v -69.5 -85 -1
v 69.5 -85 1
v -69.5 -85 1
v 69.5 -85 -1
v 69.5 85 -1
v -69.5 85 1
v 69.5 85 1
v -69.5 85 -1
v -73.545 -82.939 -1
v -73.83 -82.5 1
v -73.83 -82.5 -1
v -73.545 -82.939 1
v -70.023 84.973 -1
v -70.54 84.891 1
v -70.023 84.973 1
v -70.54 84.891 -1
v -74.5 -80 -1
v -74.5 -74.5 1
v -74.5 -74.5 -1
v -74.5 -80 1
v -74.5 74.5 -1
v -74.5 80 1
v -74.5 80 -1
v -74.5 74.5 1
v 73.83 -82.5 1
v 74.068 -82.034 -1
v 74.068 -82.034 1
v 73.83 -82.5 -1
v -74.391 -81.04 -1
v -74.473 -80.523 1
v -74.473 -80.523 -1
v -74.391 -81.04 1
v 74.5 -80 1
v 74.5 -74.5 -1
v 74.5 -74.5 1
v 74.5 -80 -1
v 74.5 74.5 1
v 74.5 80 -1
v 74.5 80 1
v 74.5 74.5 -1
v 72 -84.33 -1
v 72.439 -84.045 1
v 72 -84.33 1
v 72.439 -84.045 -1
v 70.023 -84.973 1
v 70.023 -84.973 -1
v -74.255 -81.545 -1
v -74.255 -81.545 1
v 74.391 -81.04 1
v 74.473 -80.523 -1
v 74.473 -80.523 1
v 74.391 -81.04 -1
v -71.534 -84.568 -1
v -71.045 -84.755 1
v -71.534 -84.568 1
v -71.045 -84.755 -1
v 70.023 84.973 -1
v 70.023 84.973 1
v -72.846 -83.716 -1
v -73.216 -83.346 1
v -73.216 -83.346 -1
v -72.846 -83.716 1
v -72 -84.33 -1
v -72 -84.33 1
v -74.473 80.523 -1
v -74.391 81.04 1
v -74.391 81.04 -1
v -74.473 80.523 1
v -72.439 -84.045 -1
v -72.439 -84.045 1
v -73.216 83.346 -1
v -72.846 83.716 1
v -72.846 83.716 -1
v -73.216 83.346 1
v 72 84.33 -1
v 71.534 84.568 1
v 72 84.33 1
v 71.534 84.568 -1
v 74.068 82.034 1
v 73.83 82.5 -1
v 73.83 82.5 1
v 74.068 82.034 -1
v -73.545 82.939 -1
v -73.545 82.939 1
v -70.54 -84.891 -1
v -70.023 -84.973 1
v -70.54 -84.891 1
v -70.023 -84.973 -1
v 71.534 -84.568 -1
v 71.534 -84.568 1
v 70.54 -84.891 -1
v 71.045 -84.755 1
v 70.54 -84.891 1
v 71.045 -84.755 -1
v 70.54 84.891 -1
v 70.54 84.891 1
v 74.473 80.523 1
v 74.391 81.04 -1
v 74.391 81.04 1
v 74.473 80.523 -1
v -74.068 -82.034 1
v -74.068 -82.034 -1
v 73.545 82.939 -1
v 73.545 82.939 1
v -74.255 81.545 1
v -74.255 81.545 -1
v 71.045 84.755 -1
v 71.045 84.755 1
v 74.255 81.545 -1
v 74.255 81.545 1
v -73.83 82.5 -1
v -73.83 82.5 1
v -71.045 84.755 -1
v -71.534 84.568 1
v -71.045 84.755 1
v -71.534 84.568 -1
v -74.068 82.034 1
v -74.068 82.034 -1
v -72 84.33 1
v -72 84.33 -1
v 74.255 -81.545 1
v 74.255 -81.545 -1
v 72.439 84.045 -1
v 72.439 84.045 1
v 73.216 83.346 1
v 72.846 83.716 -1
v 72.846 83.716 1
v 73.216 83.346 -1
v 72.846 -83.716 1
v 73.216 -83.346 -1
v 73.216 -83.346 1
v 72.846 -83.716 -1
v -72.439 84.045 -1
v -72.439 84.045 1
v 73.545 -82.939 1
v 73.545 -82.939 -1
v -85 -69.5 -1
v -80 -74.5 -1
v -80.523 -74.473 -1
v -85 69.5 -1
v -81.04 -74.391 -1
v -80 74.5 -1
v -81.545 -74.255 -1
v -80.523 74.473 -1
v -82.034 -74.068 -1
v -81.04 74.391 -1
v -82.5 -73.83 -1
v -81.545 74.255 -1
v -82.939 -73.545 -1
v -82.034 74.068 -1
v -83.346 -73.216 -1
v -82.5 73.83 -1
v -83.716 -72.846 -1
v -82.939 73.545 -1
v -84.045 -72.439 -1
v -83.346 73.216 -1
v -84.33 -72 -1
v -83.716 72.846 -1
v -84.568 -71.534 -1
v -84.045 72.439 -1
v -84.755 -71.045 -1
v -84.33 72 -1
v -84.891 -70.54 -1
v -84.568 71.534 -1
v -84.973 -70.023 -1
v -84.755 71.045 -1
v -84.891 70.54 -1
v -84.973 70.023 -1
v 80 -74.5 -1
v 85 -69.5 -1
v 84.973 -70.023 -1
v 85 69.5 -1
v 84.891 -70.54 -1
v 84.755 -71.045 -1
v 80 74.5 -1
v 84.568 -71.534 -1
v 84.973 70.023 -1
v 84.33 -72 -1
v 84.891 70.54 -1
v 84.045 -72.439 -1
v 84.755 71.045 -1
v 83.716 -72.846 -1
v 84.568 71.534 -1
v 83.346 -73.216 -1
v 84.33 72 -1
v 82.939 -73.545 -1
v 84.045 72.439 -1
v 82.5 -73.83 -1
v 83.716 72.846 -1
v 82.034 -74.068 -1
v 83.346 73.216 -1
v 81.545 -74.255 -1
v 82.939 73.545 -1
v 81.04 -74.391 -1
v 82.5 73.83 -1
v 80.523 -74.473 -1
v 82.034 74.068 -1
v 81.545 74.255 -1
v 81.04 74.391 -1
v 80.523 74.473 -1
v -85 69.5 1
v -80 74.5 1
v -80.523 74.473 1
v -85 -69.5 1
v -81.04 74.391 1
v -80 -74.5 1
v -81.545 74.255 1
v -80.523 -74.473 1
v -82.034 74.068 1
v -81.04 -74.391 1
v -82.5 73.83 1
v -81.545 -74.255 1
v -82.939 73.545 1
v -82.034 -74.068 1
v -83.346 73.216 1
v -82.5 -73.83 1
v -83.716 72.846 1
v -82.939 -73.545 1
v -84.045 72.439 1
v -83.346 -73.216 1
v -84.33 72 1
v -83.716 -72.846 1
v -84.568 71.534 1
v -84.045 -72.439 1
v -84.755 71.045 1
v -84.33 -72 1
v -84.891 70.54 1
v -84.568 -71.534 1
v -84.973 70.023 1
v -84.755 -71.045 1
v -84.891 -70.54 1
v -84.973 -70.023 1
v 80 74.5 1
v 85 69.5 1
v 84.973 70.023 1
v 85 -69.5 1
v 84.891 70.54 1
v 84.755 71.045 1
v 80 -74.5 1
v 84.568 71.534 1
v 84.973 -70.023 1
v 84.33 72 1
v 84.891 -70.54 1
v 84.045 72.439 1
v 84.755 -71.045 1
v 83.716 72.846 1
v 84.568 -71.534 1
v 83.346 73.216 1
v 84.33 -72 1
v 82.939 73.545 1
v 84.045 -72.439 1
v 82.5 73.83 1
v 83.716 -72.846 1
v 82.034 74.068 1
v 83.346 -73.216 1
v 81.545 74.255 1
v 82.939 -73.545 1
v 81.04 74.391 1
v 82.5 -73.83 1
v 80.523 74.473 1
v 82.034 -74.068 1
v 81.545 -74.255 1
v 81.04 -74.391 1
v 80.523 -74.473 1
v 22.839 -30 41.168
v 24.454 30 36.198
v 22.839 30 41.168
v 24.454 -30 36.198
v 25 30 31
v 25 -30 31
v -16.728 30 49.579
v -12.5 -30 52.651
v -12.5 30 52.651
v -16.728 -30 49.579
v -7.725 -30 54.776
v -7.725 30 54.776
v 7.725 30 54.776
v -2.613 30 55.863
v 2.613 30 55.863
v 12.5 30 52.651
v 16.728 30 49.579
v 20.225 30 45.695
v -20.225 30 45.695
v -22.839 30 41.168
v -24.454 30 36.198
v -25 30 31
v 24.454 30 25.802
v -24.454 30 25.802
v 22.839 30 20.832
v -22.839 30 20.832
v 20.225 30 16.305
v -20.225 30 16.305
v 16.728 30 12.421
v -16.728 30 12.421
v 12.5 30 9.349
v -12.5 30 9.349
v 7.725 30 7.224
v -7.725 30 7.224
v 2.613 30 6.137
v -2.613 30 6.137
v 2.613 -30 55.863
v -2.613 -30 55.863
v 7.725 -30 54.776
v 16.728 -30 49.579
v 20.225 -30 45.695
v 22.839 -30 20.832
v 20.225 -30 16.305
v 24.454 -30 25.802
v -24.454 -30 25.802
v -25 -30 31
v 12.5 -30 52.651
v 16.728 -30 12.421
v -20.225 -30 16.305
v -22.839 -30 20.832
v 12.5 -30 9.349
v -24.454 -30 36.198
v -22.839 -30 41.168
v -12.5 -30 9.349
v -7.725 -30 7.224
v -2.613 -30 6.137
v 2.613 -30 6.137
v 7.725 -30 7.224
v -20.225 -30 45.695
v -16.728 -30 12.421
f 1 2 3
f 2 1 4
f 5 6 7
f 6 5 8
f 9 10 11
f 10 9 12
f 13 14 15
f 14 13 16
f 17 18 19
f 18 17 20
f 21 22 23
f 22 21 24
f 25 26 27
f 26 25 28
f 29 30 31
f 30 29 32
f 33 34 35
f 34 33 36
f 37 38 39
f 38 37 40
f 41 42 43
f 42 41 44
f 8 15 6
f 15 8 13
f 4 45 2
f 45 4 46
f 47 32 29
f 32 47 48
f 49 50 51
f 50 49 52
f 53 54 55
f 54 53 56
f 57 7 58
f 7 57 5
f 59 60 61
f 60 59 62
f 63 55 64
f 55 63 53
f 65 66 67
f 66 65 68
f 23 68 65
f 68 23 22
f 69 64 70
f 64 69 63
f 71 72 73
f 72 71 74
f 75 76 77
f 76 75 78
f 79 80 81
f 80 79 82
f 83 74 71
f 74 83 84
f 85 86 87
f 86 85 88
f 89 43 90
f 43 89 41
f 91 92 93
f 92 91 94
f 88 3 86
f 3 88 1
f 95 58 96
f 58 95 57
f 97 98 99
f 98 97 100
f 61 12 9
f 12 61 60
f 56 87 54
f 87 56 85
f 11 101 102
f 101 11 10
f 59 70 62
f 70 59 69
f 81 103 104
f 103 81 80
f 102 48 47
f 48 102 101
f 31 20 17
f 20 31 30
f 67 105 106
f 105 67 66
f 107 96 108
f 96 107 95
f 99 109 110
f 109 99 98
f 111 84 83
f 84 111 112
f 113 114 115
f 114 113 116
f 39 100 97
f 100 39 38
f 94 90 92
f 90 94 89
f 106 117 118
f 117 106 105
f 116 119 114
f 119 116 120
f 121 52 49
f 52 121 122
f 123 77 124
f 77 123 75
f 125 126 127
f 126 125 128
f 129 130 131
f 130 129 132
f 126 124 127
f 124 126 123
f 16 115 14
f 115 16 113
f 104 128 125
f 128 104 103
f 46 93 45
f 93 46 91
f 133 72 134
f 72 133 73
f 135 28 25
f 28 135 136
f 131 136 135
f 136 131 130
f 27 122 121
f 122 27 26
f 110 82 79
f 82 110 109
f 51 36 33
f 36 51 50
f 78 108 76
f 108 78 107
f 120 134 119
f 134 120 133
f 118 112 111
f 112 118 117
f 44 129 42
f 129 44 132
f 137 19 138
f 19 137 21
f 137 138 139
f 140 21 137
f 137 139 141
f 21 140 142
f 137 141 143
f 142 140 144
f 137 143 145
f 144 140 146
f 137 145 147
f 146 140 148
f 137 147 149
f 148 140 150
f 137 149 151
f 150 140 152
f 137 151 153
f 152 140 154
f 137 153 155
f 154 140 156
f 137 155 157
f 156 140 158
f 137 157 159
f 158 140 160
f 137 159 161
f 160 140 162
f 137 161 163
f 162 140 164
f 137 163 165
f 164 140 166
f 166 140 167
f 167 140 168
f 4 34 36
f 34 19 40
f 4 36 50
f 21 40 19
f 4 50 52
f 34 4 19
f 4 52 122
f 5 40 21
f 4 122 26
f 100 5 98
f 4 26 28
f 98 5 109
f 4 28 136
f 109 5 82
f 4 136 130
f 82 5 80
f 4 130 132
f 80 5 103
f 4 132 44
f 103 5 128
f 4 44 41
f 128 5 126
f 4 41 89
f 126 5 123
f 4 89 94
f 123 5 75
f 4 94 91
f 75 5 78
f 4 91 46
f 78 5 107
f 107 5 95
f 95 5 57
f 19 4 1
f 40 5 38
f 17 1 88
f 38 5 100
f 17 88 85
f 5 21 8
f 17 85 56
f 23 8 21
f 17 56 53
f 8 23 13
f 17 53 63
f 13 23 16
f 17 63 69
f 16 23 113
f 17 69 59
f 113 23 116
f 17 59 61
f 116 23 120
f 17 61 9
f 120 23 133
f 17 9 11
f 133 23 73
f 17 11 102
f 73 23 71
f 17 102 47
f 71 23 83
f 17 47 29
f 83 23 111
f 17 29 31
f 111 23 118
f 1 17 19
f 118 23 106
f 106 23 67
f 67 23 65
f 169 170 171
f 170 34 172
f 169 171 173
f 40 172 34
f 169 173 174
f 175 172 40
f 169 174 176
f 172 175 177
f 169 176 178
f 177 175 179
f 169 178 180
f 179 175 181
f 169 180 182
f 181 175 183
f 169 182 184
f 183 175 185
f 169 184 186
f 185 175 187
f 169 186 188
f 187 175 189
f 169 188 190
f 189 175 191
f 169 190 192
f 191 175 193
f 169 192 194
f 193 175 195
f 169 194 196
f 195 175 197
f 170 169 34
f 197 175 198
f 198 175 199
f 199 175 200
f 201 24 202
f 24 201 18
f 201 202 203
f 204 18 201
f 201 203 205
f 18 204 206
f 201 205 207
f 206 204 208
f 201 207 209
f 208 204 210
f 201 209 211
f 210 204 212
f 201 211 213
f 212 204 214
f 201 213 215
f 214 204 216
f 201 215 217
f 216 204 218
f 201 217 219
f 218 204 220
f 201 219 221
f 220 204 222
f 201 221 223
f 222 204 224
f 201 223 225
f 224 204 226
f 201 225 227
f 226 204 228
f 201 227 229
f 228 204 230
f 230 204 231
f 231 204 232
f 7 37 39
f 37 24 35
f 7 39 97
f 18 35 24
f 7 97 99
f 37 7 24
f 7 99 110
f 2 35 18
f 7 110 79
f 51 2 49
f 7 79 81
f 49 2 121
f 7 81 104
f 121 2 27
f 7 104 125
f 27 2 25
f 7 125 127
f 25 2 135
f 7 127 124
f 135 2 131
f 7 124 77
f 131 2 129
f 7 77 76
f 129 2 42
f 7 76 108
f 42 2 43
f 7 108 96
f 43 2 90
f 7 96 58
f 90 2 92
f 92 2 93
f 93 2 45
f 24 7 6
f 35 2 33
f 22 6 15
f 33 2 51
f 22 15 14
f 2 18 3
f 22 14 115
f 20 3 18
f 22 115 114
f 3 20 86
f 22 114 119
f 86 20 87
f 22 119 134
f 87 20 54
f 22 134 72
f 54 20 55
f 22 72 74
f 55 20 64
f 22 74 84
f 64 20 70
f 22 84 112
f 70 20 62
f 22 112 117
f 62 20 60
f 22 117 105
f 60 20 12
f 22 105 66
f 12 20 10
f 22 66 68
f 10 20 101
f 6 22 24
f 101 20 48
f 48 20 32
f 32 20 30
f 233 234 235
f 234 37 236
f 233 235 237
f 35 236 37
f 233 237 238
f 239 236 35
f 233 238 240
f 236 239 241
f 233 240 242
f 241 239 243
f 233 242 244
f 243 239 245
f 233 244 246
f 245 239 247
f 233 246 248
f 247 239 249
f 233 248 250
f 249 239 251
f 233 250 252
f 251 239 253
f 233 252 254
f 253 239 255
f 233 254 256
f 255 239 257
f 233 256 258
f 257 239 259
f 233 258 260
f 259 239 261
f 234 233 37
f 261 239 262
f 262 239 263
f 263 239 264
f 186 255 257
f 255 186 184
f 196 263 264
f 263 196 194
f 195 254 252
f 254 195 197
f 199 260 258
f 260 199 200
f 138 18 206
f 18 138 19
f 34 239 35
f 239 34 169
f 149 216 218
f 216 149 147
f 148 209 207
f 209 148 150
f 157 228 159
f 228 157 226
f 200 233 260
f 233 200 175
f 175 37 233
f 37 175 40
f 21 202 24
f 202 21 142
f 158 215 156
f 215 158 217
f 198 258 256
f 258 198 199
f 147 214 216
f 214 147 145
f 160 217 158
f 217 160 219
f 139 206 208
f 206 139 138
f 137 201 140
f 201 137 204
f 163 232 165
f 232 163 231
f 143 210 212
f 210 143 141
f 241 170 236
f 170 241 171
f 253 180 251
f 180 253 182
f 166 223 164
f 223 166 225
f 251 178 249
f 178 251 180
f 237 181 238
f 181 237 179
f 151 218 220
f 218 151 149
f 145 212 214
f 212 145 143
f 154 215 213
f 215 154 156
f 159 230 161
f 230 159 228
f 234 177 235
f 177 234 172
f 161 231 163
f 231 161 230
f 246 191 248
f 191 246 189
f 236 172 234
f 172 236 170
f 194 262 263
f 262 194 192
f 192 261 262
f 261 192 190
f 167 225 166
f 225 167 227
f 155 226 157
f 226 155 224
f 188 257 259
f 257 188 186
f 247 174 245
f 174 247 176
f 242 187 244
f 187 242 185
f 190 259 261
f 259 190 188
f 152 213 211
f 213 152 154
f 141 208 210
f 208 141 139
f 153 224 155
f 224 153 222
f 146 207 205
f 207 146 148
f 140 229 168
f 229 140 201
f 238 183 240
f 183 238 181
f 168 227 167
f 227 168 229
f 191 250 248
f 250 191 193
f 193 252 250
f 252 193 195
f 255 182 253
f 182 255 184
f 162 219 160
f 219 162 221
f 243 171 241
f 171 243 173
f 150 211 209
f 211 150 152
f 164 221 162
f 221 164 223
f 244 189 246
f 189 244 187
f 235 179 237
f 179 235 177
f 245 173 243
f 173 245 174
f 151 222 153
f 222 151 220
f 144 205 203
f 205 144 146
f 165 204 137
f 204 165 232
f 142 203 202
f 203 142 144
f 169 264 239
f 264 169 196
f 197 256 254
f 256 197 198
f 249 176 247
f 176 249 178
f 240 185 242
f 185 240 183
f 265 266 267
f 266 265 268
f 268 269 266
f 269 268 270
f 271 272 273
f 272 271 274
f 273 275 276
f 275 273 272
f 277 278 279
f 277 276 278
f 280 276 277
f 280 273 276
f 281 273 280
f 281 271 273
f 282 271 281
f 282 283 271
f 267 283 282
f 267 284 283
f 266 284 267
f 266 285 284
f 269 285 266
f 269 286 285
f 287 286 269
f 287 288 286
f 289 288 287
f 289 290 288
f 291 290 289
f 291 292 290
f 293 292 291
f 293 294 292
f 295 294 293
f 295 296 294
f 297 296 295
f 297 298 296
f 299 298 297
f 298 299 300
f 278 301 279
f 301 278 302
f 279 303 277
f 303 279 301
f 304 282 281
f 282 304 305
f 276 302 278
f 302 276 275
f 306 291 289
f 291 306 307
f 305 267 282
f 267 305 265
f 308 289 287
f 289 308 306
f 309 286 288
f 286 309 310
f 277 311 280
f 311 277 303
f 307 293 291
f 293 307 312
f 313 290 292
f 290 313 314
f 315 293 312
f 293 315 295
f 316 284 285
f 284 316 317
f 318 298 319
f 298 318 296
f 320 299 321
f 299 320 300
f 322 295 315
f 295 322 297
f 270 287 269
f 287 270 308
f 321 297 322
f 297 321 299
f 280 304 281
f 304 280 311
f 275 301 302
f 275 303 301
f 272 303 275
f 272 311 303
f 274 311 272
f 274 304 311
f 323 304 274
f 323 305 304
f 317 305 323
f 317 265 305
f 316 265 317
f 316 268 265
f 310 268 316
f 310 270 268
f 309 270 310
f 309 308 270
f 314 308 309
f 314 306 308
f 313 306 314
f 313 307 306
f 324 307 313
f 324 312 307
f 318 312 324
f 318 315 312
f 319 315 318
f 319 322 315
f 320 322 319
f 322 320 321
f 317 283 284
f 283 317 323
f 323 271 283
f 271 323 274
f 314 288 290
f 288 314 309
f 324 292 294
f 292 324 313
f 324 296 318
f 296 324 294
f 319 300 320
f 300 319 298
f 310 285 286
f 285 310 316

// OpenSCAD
// file: ../core/standoffs.scad
// ============== ETHOSCOPE CHILD MODULES ============= //



// module standoff_single(bolt_diam, standoff_height, wall_thick){
//     bolt_diam = bolt_diam + 0.15; // Here's changing the camera bolt size
//     $fn=30;
//     difference(){
//         hull(){
//             translate([0,0,standoff_height-0.2]) cylinder(d=bolt_diam+wall_thick, h=0.1);
//             cylinder(d=(bolt_diam+wall_thick)*standoff_height/4, h=0.1);
//         }
//         cylinder(d=bolt_diam, h=standoff_height); 
//     }
// }


// module standoff_quad(standoff_dims, bolt_diam, wall_thick){
//     for (i=[-1,1]){
//         translate([standoff_dims[0]/2,i*standoff_dims[1]/2,0])
//         standoff_single(bolt_diam, standoff_dims[2], wall_thick);
//     }
//     mirror([1,0,0])
//     for (i=[-1,1]){
//         translate([standoff_dims[0]/2,i*standoff_dims[1]/2,0])
//         standoff_single(bolt_diam, standoff_dims[2], wall_thick);
//     }
// }
// file: ../core/rounded_cube.scad
module rounded_cube(
    dims, 
    radius=1, 
    outside=false, 
    $fn=60
) {

    new_dims = dims / 2;
    if (outside==true){
        new_dims = [new_dims[0] - radius, new_dims[1] - radius, new_dims[2]];
        points = [  [new_dims[0],-new_dims[1],0], 
                [new_dims[0],new_dims[1],0], 
                [-new_dims[0],new_dims[1],0], 
                [-new_dims[0],-new_dims[1],0] ];
        translate([0,0,-dims[2]/2])
        hull(){
            for (p = points){
                translate(p) cylinder(r=radius, h=dims[2]);
            }
        }
    } else {
        points = [  [new_dims[0],-new_dims[1],0], 
                [new_dims[0],new_dims[1],0], 
                [-new_dims[0],new_dims[1],0], 
                [-new_dims[0],-new_dims[1],0] ];
        translate([0,0,-dims[2]/2])
        hull(){
            for (p = points){
                translate(p) cylinder(r=radius, h=dims[2]);
            }
        }
    }
}
// file: ../core/o_ring.scad
// === Module: O-ring === //
module o_ring(outer_diam, ring_diam) {
    outer_diam = outer_diam + 1;
    rotate([0,0,0])
    rotate_extrude(angle=360) {
        translate([(outer_diam-ring_diam/2)/2, 0])
        circle(d=ring_diam); 
        } // rotate_extrude
    cylinder(d=outer_diam-ring_diam/2, h=ring_diam, center=true);
}
// file: ../core/makerbeam.scad
module makerbeam_end(
    bolt_diam, 
    makerbeam, 
    length=10
) {
    
    // The last part of a MakerBeam along with a a flatheaded bolt for mounting
    
    translate([0,0,length/2+(2/3)*bolt_diam]) 
    rotate([0,90,0]){   // Bring things up to level
        cube([length, makerbeam, makerbeam], center=true);   // MakerBeam
        translate([length/2+(2/3)*bolt_diam,0,0]) rotate([0,-90,0]){
            cylinder(h=length, d=bolt_diam);    // Bolt
            hull(){     // Bolt head
                translate([0,0,(2/3)*bolt_diam]) cylinder(h=0.1, d=bolt_diam);
                cylinder(h=0.2, d=bolt_diam*2);
            }
        }
    }
}
// file: ../core/magnets.scad
function magnet_size_correct(magnet_size) 
    = [ magnet_size[0]+0.4, magnet_size[1]+0.2 ];

module magnets(dims, magnet_size, wall_thick){
    magnet_size_corrected = magnet_size_correct(magnet_size);
    
    for (i = [-1,1]){
        for (j = [0,1]){
            translate([i*dims[0]/2,0,0]){
                mirror([j,0,0])
                cylinder(d=magnet_size_corrected[0], h=magnet_size_corrected[1]);
            }
        }
    }
    // for (i=[-1,1]) {
    //     translate([dims[0]/2,i*dims[1]/2,-(magnet_size_corrected[1])])
    //     cylinder(d=magnet_size_corrected[0], h=magnet_size_corrected[1]);
    // }
}
// file: ../core/functions.scad
function add(vector, k) = [ for (vector=vector) vector+k ];
    
function get_points(distances) // A vector of 2
    = [ [-distances[0]/2,-distances[1]/2],
        [distances[0]/2,-distances[1]/2],
        [-distances[0]/2,distances[1]/2],
        [distances[0]/2,distances[1]/2]
    ];

function selector(item, dict) = dict[search([item], dict)[0]];
// file: ../core/cross.scad
module cross(dims, outer_length, magnet_size=[0,0], wall_thick){
    for (i=[-1,1]) {
        hull(){
            translate([dims[0]/2,i*dims[1]/2,0]) 
            cylinder(h=magnet_size[1]+wall_thick, d=outer_length, center=true);
            
            translate([-dims[0]/2,-i*dims[1]/2,0]) 
            cylinder(h=magnet_size[1]+wall_thick, d=outer_length, center=true);
        }
    }
}
// file: ../core/corners.scad
use <rounded_cube.scad>;

module corners(dims, outer_length){
    for (i=[-1,1]) {
        translate([dims[0]/2,i*dims[1]/2,0])
        rounded_cube([outer_length,outer_length,dims[2]],2);
    }
}

module corners_hollow(dims, makerbeam, bolt_diam){
    for (i=[-1,1]) {
        translate([dims[0]/2,i*dims[1]/2,-dims[2]/2])
        makerbeam_end(bolt_diam=bolt_diam, makerbeam=makerbeam, length=dims[2]);
    } 
}
// file: ../core/core.scad
// 

include <corners.scad>;
include <cross.scad>;
include <functions.scad>;
include <magnets.scad>;
include <makerbeam.scad>;
include <o_ring.scad>;
include <rounded_cube.scad>;
include <standoffs.scad>;
// file: arena_wellplate.scad
// -------------------------------- //
// ----------- Wellplate ---------- //
// -------------------------------- //

use <arena_empty.scad>;
use <../core/core.scad>;

module arena_wellplate(
    dims, 
    magnet_dims, 
    wellplate_dims,
    magnet_size, 
    makerbeam,
    target_diam
) {
    
    magnet_dims = [magnet_dims[0], magnet_dims[1], magnet_size[1]+2];
    
    dimsA = [dims[0]-makerbeam-1, dims[1]+makerbeam, dims[2]];
    dimsB = [dims[0]+makerbeam, dims[1]-makerbeam-1, dims[2]];
    
    wp_outer = [wellplate_dims[0]+2, wellplate_dims[1]+2, wellplate_dims[2]];
    difference(){
        union(){
            // Plate base + magnet holders
            rounded_cube(dimsA, makerbeam/2, true);
            rounded_cube(dimsB, makerbeam/2, true);
            translate([0,0,magnet_dims[2]/2-dims[2]/2]){
                corners(magnet_dims, makerbeam); // Magnets
                mirror([1,0,0]) corners(magnet_dims, makerbeam); // Magnets
            }
            
            // Wellplate surround
            difference(){
                translate([0,0,dims[2]]) cube(wp_outer, center=true);
                translate([0,0,dims[2]]) cube(wellplate_dims, center=true);
            }
            
            // Make targets
            translate([0,0,dims[2]])
            for (i=[-1,1]){
                for (j=[-1,1]){
                    if (i > 0 && j > 0){ // Blank out to only make 3 targets
                        } else {
                            translate([i*dimsA[0]/2-20*i,j*wp_outer[1]/2+j*(dims[1]-wp_outer[1])/4,0])
                            cylinder(d=target_diam, h=dimsA[2], center=true);
                        }
                }
            }
        }

          
      // Bottom magnets
      translate([0,0,dims[2]]){
        magnets(magnet_dims, magnet_size, 3);
        mirror([1,0,0]) magnets(magnet_dims, magnet_size, 3);
      }
  }
}
// file: arena_vertical.scad
use <arena_empty.scad>;
use <../core/core.scad>;

$fn = 30;

/* [General:] */
// combo box for number
wall_thick = 3;
primary_bolt = 3;
secondary_bolt = 2;
makerbeam = 10;
magnet_size = [6.2,3]; // diameter, height
wellplate_dims = [127.63,85.47,2]; 
target_diam = 7;

// Dimensions
dims = [160,160,15]; //normal length
magnet_dims = [dims[0]-25,dims[1],magnet_size[1]*2+wall_thick];
light_chamber_dims = [dims[0],dims[1],50];
arena_dims = [dims[0],dims[1],2];

// [diameter, height, gap width]
chamber_dims = [40,60]; // [
beam_height = 300;

// Camera specs
cam_dims = [40, 40]; // USB: [40,40] - RPi: [30, 25]
lens_diam = 25; // lens hole diameter
standoff_dims = [34,34,10]; // USB: [34,34,10] - RPi: [21,13.5,6];

arena_metabolic_chamber_vertical(
    arena_dims, 
    magnet_dims, 
    chamber_dims,
    magnet_size, 
    makerbeam
);

module arena_metabolic_chamber_vertical(
    dims, 
    magnet_dims, 
    chamber_dims,
    magnet_size, 
    makerbeam,
) {
    chamber_d = chamber_dims[0]+2;
    chamber_h = chamber_dims[1];
    wall_thickness = 4;
    rubber_r = 1;
    
    union(){
        // Arena base
        arena_empty(
            dims = dims, 
            magnet_dims = magnet_dims,
            magnet_size = magnet_size, 
            makerbeam = makerbeam
        );
        
        // Translate other stuff on top
        translate([0,0,(chamber_dims[1]+dims[2])/2]){
            // Other stuff
            difference(){
                rotate([90,0,0])
                cylinder(d=chamber_d+2*wall_thickness, h=chamber_h, center=true);
            }
        }
    }
        
}
// file: arena_tubes.scad
// ----------------------------------------- //
// ---------------- Tubes ------------------ //
// ----------------------------------------- //

use <arena_empty.scad>;
use <../core/core.scad>;

module arena_tubes(
    dims, 
    magnet_dims, 
    magnet_size, 
    tube_dims,
    makerbeam
) {
    union(){
        difference(){
            // Arena base
            arena_empty(
                dims = dims, 
                magnet_dims = magnet_dims,
                magnet_size = magnet_size, 
                makerbeam = makerbeam,
                corner_height=magnet_size[1]+2
            );
            // Remove outer edges
            removal = 20;
            translate([((dims[0]+removal/2)/2)-0.4,0,0])
            cube([removal,dims[1],makerbeam], center=true);
            translate([((-dims[0]-removal/2)/2)+0.4,0,0])
            cube([removal,dims[1],makerbeam], center=true);
        }
        
        tube_disp = (tube_dims[2]-15) / 2;
        echo(tube_disp)
        
        translate([0,0,tube_dims[0]/4+dims[2]])
        for (i=[-1,1]){
            translate([i*tube_disp,0,0])
            horizontal_tube_rack(
                tube_diam = tube_dims[0], 
                beam_width = makerbeam, 
                rack_length = 170, 
                magnet_size = magnet_size,
                insert = false);
        }
    }
}

// === Module: Test tube rack === //
module horizontal_tube_rack(
    tube_diam, 
    beam_width, 
    rack_length, 
    magnet_size,
    insert=false
) {
    
    tube_diam = tube_diam + 0.1;
    min_space_between = 3;
    space_above = 5;
    beam_width = beam_width + 0.2;
    rack_width = (4*wall_thick)+ring_diam;
    echo(rack_width);
    rack_height = space_above+tube_diam/2;
    end_space = 2 * (beam_width+wall_thick);
    
    // Calculate the max number of tubes and their spacing
    func_tube = tube_diam+min_space_between;
    n_tubes = floor((rack_length)/(tube_diam+min_space_between));
    shift = (rack_length - (n_tubes*tube_diam + (n_tubes-1)*min_space_between)) / 2;
    
    union(){
        difference(){
            rounded_cube([rack_width, rack_length, rack_height], radius=makerbeam/2, outside=true);
            
            // Inserts for tubes
            rotate([0,90,0])
            translate([-rack_height/2,-(rack_length-tube_diam)/2+shift,0])
            for (i=[0:1:n_tubes-1]){
                translate([0,i*(tube_diam+min_space_between),0]){
                    cylinder(d=tube_diam, h=beam_width, center=true);
                    o_ring(outer_diam,ring_diam);
                }
            }

            // Inserts for separators
            if (insert == true){
                rotate([0,90,0])
                translate([-rack_height/2,-(rack_length-tube_diam)/2-shift*0.9,0])
                for (i=[0:1:n_tubes]){
                    translate([0,i*(tube_diam+min_space_between),0]){
                        cube([rack_length, sep_width+0.25, rack_height], center=true);
                    }
                }
            }

            // Inserts for magnets
            translate([0,-(rack_length-tube_diam)/2+shift,-rack_height/2+magnet_size[1]-1])
            for (i=[0:1:n_tubes-1]){
                translate([0,i*(tube_diam+min_space_between),0])
                cylinder(d=magnet_size[0], h=magnet_size[1]+0.5);
            }
            
            // Standing rack
            if (standing > 0.5){
                end_length = 2*beam_width;
                bolt_rad= (bolt_diameter+1)/2;
            }
        }
    }
}


// module tube_insert(
//     chamber_length,
//     inner_d,
//     min_height
// ){
//     inner_d = inner_d - 0.1;
//     chamber_length = chamber_length - 2*9.5;
//     // rotate([90,0,0])
//     difference(){
//         cylinder(d=inner_d, h=chamber_length, center=true);
//         translate([5,0,0]){
//             for (i=[-1,1]){
//                 rotate([90,0,0])
//                 translate([i*0.2*inner_d,i*0.2*chamber_length,0])
//                 hull(){
//                     cylinder(d=inner_d*0.5, h=inner_d, center=true);
//                     translate([0,i*0.5*chamber_length,0])
//                     cylinder(d=inner_d*0.5, h=inner_d, center=true);
//                 }
//             }
//             // translate([0,5,0])
//             hull(){
//                 rotate([90,0,0])
//                 translate([0.2*inner_d,0.2*chamber_length,0])
//                 cylinder(d=inner_d*0.5, h=inner_d, center=true);
//                 rotate([90,0,0])
//                 translate([-0.2*inner_d,-0.2*chamber_length,0])
//                 cylinder(d=inner_d*0.5, h=inner_d, center=true);
//             }
//         }
//     }
//     intersection() {
//         difference(){
//             cylinder(d=inner_d, h=chamber_length, center=true);
//             cylinder(d=inner_d-3, h=chamber_length, center=true);
//         }
//         #translate([0,inner_d/2,0])
//         hull(){
//                 rotate([90,0,0])
//                 translate([0.2*inner_d,-0.1*chamber_length,0])
//                 cylinder(d=inner_d, h=inner_d, center=true);
//                 rotate([90,0,0])
//                 translate([-0.2*inner_d,0.1*chamber_length,0])
//                 cylinder(d=inner_d*0.5, h=inner_d, center=true);
//             }
//     }
// }
// file: arena_spacer.scad
// -------------------------------- //
// ------------ Spacer ------------ //
// -------------------------------- //

use <arena_empty.scad>;

module arena_spacer(
    dims,
    magnet_dims,
    magnet_size,
    makerbeam,
    corner_height
) {
    
    arena_empty(
            dims = dims, 
            magnet_dims = magnet_dims,
            magnet_size = magnet_size, 
            makerbeam = makerbeam,
            corner_height=20,
            top_magnets = true
        );
}
// file: arena_respirometry.scad
// ----------------------------------------- //
// ------------- Respirometry -------------- //
// ----------------------------------------- //

use <arena_empty.scad>;

module arena_metabolic_chamber(
    dims, 
    magnet_dims, 
    chamber_dims,
    magnet_size, 
    makerbeam
) {
    
    chamber_d = chamber_dims[0]+2;
    chamber_h = chamber_dims[1];
    wall_thickness = 4;
    rubber_r = 1;
    
    union(){
        // Arena base
        arena_empty(
            dims = dims, 
            magnet_dims = magnet_dims,
            magnet_size = magnet_size, 
            makerbeam = makerbeam,
            corner_height=magnet_size[1]+2
        );
        
        // Translate other stuff on top
        translate([0,0,(chamber_dims[1]+dims[2])/2]){
            // Other stuff
            difference(){
                cylinder(d=chamber_d+2*wall_thickness, h=chamber_h, center=true);
                cylinder(d=chamber_d, h=chamber_h+1, center=true);
                cube([200,90,chamber_h+1], center=true);
                cube([chamber_dims[2],200,chamber_h+1], center=true);
                rotate_extrude(convexity = 10)
                translate([(chamber_dims[0]+2*wall_thickness + rubber_r)/2, 0, 0])
                circle(r = 1, $fn = 100);
            }
        }
    }    
}
// file: arena_preference.scad
use <arena_empty.scad>;

module arena_sleep_preference(
    dims,
    magnet_dims,
    magnet_size,
    makerbeam
) {
    union(){
        // Arena base
        difference(){
            arena_empty(
                dims = dims, 
                magnet_dims = magnet_dims,
                magnet_size = magnet_size, 
                makerbeam = makerbeam,
                corner_height=magnet_size[1]+2
            );
            
            // Remove outer edges
            removal = 20;
            translate([((dims[0]+removal/2)/2)-0.4,0,0])
            cube([removal,dims[1],makerbeam], center=true);
            translate([((-dims[0]-removal/2)/2)+0.4,0,0])
            cube([removal,dims[1],makerbeam], center=true);
        }
        
        for (i=[-1,1]){
            for (j=[-1,1]){
                translate([i*dims[1]/4.5, j*dims[1]/4.5,0])
                sleep_preference_module();
            }
        }
    }
}


module sleep_preference_module(
    n_rooms = 4
) {

    outer_d = 68;
    glass_h = 10;
    neopixel_h = glass_h - 4;
    neopixel_d_outer = 66;
    neopixel_d_inner = 52;
    inner_d = 30;
    translate([0,0,2])
    difference(){
        union(){
            // Outer high
            difference(){
                cylinder(d=outer_d,h=glass_h+2);
                cylinder(d=outer_d-1, h=glass_h+4);
            }
            
            // Outer glass
            difference(){
                cylinder(d=outer_d-1, h=glass_h);
                cylinder(d=outer_d-2, h=glass_h+2);
            }
            
            // Outer NeoPixel
            difference(){
                cylinder(d=neopixel_d_outer, h=glass_h-4);
                cylinder(d=neopixel_d_outer-2, h=glass_h);
            }
            
            // Inner NeoPixel
            difference(){
                cylinder(d=neopixel_d_inner+1, h=glass_h-4);
                cylinder(d=neopixel_d_inner-1, h=glass_h);
            }
            
            // Outer bedroom wall
            difference(){
                cylinder(d=neopixel_d_inner-1, h=glass_h);
                cylinder(d=neopixel_d_inner-2, h=glass_h+2);
            }
            
            // Inner wall
            difference(){
                cylinder(d=inner_d, h=10);
                cylinder(d=inner_d-2, h=16);
                translate([0,0,2.5])
                for (i=[0,90]){
                    rotate([0,0,i])
                    cube([50,10,5], center=true);
                }
            }
            
            // Side walls
            union(){
                for (i=[45,135]){
                    for (j=[-10,10]){
                        difference(){
                            rotate([0,0,i+j])
                            translate([0,0,5])
                            cube([2,neopixel_d_outer,10], center=true);
                            cylinder(d=inner_d-2,h=11);
                        }
                    }
                }
            }     
        }
        translate([0,0,neopixel_h])
        difference(){
            cylinder(d=neopixel_d_outer, h=4);
            translate([0,0,-1])
            cylinder(d=neopixel_d_inner-1, h=6);
        }
        
        #rotate([0,0,45])
        translate([outer_d/2,0,glass_h+0.5])
        cube([5,5,3], center=true);
    }
    
    // Bottom floor
    cylinder(d=outer_d, h=2);
   
}
// file: arena_empty.scad
use <../core/core.scad>;

module arena_empty(
    dims, 
    magnet_dims,
    magnet_size,
    makerbeam,
    corner_height,
    top_magnets=false,
) {
        
    magnet_dims = [magnet_dims[0], magnet_dims[1], corner_height];
    
    
    dimsA = [dims[0]-makerbeam-1, dims[1]+makerbeam, dims[2]];
    dimsB = [dims[0]+makerbeam, dims[1]-makerbeam-1, dims[2]];
    echo(magnet_dims[2]);
    difference(){
        union(){
            
            // Plate base + magnet holders
            rounded_cube(dimsA, makerbeam/2, true);
            rounded_cube(dimsB, makerbeam/2, true);
            translate([0,0,magnet_dims[2]/2-dims[2]/2]){
            //     corners(magnet_dims, makerbeam); // Corners
            //     mirror([1,0,0]) corners(magnet_dims, makerbeam); // Corners
            }
        }
               
        // Bottom magnets
        translate([0,0,magnet_size[1]/2]){
            magnets([magnet_dims[0], magnet_dims[1], magnet_size[1]+2], magnet_size, 3);
            mirror([1,0,0]) magnets([magnet_dims[0], magnet_dims[1], magnet_size[1]+2], magnet_size, 3);
        }
        if (top_magnets == true){
            // Bottom magnets
            translate([0,0,corner_height-dims[2]/2]){
                magnets(magnet_dims, magnet_size, 3);
                mirror([1,0,0]) magnets(magnet_dims, magnet_size, 3);
        }
    }
  }
}

module wall(
    dims, 
    wall_thick, 
    with_floor=false, 
    with_led=false,
    floor_thick=2
){
    extra = 1;
    inner_dims = dims + [-2*wall_thick,-2*wall_thick,1];
    dims_negative = dims + [1,1,0];
    hole_width = 5;
    n_holes = [floor((dims[0]) / (hole_width*2)),
               floor((dims[1]) / (hole_width*2))];

    difference(){
        rounded_cube(dims, 2);
        if (with_floor==true){
            translate([0,0,floor_thick])
            rounded_cube(inner_dims, 2);
            translate([0,0,dims[2]-10])
            rounded_cube(dims_negative, 2);
        } else {
            rounded_cube(inner_dims, 2);
        }
        if (with_led==true){
            translate([0,0,-dims[2]/4])
            for (i=[-1,1]){
                for (j=[0,1]){
                    rotate([0,0,j*90])
                    translate([i*(dims[0]-1.5*wall_thick)/2,0,0]){
                        cube([wall_thick,dims[1]-20,14], center=true);
                        translate([0,i*(dims[1]-50)/2,4])
                        cube([wall_thick*2,9,19], center=true);
                    }
                }
            }
        }
    }
}
// main file
include <arena_empty.scad>;
include <arena_preference.scad>;
include <arena_respirometry.scad>;
include <arena_spacer.scad>;
include <arena_tubes.scad>;
include <arena_vertical.scad>;
include <arena_wellplate.scad>;
